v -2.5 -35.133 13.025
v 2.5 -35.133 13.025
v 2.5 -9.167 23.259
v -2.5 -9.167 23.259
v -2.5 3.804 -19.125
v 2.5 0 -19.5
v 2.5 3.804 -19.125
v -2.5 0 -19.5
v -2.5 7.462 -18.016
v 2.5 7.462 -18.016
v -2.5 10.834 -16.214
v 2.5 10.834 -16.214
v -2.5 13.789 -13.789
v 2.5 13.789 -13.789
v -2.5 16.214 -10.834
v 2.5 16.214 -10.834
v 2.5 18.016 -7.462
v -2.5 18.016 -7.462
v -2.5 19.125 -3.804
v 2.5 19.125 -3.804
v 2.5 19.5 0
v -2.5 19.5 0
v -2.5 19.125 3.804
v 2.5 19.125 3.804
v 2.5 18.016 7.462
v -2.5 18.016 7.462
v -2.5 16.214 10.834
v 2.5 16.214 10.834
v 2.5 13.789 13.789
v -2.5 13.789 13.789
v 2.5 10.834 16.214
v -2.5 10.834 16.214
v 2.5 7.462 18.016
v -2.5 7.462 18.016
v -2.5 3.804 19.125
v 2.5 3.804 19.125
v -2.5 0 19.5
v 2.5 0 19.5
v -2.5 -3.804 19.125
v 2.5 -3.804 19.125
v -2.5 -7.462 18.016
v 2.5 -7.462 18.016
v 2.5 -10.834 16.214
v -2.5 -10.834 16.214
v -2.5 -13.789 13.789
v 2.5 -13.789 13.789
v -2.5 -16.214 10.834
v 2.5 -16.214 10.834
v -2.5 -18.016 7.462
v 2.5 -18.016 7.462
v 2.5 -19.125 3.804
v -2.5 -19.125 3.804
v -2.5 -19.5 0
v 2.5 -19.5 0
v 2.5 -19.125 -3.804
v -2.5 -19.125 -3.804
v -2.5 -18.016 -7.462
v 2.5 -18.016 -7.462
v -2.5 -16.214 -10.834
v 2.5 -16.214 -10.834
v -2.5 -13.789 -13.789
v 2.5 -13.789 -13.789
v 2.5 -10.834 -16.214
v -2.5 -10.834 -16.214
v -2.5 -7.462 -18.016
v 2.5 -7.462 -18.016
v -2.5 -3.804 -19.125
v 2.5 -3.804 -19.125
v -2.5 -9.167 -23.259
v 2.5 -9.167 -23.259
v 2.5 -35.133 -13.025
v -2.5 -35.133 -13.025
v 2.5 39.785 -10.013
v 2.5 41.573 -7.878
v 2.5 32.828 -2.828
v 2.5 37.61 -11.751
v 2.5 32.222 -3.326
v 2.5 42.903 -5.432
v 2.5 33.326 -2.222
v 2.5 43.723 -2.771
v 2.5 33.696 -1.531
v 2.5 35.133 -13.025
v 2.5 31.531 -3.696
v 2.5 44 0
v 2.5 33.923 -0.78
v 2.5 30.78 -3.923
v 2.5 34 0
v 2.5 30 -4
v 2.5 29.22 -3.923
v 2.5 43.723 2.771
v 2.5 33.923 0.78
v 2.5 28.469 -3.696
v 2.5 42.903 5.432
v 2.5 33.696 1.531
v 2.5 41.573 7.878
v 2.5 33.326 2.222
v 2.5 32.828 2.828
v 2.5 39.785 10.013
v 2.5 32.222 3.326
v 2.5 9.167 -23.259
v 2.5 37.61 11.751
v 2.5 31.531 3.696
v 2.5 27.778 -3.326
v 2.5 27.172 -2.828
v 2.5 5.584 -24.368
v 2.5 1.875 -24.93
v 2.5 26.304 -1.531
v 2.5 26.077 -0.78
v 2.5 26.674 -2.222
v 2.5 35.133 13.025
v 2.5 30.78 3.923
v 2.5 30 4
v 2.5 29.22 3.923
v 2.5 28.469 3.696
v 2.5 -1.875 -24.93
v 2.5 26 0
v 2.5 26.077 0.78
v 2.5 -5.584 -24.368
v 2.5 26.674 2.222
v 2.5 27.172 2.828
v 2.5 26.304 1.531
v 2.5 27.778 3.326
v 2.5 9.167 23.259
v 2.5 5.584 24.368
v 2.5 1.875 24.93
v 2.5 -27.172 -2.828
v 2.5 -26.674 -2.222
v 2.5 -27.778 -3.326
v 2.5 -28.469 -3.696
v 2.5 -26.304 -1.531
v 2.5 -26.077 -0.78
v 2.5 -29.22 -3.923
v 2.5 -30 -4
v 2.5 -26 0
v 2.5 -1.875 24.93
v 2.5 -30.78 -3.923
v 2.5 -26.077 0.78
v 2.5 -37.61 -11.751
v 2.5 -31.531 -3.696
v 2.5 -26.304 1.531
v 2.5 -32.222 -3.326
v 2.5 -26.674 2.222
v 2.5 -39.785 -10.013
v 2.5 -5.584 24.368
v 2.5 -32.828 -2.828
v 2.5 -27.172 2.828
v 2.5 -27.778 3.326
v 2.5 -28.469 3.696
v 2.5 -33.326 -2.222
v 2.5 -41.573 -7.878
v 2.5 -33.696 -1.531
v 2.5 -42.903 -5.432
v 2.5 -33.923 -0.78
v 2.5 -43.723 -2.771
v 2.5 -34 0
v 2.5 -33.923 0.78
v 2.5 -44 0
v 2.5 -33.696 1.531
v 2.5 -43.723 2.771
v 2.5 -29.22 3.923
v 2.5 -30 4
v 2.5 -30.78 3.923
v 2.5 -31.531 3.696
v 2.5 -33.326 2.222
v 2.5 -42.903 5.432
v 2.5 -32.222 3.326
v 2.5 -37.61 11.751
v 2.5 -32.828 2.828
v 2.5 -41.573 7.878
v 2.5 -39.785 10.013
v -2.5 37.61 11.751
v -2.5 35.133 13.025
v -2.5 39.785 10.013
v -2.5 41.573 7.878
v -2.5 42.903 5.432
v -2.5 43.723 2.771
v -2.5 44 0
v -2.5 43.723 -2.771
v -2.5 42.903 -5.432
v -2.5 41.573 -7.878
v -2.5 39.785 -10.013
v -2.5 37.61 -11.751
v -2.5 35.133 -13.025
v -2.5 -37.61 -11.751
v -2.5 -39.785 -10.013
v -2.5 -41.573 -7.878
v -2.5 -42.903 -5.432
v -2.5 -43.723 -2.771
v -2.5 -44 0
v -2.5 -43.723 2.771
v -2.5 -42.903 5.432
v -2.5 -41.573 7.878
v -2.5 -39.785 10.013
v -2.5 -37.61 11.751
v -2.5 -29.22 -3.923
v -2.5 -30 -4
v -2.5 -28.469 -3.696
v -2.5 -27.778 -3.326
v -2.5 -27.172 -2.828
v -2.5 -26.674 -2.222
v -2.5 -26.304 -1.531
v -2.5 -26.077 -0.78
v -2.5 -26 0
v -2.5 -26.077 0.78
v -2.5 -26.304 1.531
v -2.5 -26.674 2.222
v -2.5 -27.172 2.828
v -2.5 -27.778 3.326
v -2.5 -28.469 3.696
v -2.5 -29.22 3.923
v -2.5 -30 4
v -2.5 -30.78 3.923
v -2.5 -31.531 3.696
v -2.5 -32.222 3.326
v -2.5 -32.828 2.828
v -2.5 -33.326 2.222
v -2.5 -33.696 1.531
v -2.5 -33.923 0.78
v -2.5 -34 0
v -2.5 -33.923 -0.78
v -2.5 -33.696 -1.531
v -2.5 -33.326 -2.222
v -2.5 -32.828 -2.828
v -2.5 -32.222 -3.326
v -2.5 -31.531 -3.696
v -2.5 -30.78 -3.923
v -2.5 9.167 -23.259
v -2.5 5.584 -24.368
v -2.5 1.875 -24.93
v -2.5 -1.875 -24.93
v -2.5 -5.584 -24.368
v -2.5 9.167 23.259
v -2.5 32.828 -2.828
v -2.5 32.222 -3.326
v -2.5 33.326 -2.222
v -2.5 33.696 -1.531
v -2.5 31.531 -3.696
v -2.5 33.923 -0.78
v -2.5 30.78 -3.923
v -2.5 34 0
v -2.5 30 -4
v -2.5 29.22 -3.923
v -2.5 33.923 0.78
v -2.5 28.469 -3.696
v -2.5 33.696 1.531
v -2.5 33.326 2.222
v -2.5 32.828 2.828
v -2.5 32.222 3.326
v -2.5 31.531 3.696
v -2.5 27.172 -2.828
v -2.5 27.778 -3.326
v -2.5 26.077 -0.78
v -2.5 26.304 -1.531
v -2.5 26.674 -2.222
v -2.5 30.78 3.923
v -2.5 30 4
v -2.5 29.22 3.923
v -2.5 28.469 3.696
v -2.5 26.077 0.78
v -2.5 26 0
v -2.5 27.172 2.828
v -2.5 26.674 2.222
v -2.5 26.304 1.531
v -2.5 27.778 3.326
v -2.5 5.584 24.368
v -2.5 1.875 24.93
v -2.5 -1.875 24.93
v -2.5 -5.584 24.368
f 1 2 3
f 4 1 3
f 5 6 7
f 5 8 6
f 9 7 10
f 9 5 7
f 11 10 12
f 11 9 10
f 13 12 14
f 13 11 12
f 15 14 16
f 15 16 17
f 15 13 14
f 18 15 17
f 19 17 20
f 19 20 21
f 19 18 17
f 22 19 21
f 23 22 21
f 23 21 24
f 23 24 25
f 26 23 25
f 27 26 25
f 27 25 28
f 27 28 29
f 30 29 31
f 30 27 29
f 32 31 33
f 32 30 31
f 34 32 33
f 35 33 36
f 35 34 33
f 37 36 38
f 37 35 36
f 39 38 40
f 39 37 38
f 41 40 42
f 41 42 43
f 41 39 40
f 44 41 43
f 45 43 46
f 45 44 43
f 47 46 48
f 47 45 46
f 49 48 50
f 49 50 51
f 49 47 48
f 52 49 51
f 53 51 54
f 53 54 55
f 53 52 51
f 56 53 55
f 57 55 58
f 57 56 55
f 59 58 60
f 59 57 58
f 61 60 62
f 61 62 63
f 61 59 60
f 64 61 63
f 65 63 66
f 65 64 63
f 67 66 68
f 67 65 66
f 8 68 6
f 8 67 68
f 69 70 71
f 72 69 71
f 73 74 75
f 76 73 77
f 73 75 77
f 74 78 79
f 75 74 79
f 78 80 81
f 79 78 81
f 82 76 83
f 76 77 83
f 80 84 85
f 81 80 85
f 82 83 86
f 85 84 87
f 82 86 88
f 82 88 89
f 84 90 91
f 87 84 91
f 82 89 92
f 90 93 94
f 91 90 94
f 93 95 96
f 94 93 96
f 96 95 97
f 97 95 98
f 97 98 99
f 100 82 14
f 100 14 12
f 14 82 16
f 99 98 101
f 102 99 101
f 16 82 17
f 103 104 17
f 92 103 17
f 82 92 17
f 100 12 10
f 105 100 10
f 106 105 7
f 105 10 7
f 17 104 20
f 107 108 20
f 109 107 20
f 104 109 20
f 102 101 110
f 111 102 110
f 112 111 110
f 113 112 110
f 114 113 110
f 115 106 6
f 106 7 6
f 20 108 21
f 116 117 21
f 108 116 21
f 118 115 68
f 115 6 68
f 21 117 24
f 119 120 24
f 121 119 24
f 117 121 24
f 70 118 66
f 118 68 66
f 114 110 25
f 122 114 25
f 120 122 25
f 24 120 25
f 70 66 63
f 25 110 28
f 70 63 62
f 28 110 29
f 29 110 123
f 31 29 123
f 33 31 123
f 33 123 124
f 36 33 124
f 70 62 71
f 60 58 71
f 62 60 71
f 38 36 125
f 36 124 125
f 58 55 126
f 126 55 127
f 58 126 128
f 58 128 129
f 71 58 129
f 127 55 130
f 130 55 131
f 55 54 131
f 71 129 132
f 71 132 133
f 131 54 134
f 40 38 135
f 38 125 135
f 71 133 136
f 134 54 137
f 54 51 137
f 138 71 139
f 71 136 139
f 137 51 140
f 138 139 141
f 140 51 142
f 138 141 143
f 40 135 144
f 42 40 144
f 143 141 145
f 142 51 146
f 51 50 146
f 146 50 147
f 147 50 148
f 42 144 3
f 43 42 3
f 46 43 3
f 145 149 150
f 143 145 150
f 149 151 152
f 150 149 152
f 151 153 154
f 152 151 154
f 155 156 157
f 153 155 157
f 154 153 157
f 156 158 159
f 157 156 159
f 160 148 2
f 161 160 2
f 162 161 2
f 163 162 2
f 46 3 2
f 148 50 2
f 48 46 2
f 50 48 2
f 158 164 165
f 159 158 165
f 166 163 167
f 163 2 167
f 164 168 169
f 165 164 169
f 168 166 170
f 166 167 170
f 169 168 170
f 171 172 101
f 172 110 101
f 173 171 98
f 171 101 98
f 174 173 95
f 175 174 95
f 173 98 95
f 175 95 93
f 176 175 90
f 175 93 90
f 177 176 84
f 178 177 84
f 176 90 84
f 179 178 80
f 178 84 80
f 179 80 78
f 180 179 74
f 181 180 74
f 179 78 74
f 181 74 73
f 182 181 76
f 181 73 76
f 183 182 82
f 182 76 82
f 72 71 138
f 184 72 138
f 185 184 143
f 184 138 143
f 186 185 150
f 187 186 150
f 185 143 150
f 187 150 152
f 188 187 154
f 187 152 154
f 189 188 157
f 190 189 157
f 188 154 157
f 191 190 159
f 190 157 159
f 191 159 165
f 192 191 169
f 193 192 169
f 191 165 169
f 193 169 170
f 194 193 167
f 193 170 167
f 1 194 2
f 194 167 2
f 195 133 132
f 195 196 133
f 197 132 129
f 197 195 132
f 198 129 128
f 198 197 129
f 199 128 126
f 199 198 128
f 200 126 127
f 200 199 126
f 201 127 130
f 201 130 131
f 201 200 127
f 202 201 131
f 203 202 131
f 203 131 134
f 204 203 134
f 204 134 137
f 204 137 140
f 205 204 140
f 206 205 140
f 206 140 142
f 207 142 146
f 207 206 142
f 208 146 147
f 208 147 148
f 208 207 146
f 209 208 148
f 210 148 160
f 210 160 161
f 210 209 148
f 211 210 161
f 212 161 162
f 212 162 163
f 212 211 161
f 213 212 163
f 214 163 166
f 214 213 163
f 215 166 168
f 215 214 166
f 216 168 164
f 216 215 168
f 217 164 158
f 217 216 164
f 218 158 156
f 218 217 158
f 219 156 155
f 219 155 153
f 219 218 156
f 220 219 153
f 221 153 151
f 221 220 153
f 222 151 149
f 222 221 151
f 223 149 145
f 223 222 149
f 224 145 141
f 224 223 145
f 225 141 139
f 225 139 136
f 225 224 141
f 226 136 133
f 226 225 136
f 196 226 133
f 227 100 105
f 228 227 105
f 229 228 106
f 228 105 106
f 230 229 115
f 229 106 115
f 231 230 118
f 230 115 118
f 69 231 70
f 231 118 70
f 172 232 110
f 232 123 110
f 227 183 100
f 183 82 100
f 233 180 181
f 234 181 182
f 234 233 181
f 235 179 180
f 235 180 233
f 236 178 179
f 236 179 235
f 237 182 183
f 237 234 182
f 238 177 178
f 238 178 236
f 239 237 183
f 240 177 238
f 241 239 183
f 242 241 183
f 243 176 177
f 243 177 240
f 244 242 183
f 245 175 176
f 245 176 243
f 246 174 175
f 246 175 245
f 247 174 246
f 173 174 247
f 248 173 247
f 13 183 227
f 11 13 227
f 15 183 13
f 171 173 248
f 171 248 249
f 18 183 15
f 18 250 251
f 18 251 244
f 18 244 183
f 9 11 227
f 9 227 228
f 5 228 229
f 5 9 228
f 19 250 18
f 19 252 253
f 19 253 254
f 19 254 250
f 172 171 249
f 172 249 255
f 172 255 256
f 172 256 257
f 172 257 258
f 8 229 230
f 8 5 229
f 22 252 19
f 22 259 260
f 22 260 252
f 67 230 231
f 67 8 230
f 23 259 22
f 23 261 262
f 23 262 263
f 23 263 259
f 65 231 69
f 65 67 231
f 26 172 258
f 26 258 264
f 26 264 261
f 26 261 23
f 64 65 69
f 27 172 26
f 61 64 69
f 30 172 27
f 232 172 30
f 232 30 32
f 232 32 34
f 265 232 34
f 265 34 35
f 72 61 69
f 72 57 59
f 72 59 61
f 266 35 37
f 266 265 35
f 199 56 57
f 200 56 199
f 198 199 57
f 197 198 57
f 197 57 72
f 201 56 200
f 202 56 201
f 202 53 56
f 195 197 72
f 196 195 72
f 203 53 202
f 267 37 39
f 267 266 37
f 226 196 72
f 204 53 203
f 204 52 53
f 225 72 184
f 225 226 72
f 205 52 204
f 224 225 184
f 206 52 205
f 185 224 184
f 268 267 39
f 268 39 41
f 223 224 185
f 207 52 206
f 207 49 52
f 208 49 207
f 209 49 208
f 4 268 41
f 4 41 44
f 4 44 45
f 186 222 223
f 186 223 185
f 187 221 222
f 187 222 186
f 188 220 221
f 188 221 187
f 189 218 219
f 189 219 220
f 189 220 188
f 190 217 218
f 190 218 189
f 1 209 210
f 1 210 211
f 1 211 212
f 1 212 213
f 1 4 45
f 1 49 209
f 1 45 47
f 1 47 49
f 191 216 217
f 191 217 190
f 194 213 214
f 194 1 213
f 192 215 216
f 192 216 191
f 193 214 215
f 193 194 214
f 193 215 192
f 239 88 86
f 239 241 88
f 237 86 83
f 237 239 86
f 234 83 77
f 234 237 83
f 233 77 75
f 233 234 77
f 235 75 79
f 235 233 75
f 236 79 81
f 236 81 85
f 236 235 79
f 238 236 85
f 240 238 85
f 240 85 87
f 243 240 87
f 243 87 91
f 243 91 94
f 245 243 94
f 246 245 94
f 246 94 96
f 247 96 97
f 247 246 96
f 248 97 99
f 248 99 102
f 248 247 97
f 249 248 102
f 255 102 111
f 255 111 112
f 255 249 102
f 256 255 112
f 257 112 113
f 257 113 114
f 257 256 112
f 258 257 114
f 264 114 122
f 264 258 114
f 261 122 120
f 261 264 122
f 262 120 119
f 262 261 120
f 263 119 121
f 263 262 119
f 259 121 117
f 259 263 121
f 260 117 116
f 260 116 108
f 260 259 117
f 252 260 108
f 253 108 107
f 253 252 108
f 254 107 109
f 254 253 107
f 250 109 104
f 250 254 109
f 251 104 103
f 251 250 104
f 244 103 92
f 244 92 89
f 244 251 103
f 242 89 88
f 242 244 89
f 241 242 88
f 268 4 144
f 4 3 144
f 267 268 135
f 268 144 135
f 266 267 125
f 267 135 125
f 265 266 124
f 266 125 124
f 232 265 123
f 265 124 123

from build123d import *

# Parameters (mm, degrees)
SKETCH1_R           = 19.5
SKETCH1_R_2         = 4
BOSS_EXTRUDE1_DEPTH = 2.5


with BuildPart() as part:
    # Sketch1 → Boss-Extrude1 (new, symmetric)
    with BuildSketch(Plane.YZ):
        with BuildLine():
            Line((-35.133333333, 13.024933354), (-9.166666667, 23.258809562))
            ThreePointArc((-9.166666667, 23.258809562), (0, 25), (9.166666667, 23.258809562))
            Line((9.166666667, 23.258809562), (35.133333333, 13.024933354))
            ThreePointArc((35.133333333, 13.024933354), (44, 0), (35.133333333, -13.024933354))
            Line((35.133333333, -13.024933354), (9.166666667, -23.258809562))
            ThreePointArc((9.166666667, -23.258809562), (0, -25), (-9.166666667, -23.258809562))
            Line((-9.166666667, -23.258809562), (-35.133333333, -13.024933354))
            ThreePointArc((-35.133333333, -13.024933354), (-44, 0), (-35.133333333, 13.024933354))
        make_face()
        with Locations(Location((0, 0, 0), (0, 0, 270))):
            Circle(SKETCH1_R, mode=Mode.SUBTRACT)
        with Locations(Location((30, 0, 0), (0, 0, 270))):
            Circle(SKETCH1_R_2, mode=Mode.SUBTRACT)
        with Locations(Location((-30, 0, 0), (0, 0, 270))):
            Circle(SKETCH1_R_2, mode=Mode.SUBTRACT)
    extrude(amount=BOSS_EXTRUDE1_DEPTH, both=True)


solid = part.part
